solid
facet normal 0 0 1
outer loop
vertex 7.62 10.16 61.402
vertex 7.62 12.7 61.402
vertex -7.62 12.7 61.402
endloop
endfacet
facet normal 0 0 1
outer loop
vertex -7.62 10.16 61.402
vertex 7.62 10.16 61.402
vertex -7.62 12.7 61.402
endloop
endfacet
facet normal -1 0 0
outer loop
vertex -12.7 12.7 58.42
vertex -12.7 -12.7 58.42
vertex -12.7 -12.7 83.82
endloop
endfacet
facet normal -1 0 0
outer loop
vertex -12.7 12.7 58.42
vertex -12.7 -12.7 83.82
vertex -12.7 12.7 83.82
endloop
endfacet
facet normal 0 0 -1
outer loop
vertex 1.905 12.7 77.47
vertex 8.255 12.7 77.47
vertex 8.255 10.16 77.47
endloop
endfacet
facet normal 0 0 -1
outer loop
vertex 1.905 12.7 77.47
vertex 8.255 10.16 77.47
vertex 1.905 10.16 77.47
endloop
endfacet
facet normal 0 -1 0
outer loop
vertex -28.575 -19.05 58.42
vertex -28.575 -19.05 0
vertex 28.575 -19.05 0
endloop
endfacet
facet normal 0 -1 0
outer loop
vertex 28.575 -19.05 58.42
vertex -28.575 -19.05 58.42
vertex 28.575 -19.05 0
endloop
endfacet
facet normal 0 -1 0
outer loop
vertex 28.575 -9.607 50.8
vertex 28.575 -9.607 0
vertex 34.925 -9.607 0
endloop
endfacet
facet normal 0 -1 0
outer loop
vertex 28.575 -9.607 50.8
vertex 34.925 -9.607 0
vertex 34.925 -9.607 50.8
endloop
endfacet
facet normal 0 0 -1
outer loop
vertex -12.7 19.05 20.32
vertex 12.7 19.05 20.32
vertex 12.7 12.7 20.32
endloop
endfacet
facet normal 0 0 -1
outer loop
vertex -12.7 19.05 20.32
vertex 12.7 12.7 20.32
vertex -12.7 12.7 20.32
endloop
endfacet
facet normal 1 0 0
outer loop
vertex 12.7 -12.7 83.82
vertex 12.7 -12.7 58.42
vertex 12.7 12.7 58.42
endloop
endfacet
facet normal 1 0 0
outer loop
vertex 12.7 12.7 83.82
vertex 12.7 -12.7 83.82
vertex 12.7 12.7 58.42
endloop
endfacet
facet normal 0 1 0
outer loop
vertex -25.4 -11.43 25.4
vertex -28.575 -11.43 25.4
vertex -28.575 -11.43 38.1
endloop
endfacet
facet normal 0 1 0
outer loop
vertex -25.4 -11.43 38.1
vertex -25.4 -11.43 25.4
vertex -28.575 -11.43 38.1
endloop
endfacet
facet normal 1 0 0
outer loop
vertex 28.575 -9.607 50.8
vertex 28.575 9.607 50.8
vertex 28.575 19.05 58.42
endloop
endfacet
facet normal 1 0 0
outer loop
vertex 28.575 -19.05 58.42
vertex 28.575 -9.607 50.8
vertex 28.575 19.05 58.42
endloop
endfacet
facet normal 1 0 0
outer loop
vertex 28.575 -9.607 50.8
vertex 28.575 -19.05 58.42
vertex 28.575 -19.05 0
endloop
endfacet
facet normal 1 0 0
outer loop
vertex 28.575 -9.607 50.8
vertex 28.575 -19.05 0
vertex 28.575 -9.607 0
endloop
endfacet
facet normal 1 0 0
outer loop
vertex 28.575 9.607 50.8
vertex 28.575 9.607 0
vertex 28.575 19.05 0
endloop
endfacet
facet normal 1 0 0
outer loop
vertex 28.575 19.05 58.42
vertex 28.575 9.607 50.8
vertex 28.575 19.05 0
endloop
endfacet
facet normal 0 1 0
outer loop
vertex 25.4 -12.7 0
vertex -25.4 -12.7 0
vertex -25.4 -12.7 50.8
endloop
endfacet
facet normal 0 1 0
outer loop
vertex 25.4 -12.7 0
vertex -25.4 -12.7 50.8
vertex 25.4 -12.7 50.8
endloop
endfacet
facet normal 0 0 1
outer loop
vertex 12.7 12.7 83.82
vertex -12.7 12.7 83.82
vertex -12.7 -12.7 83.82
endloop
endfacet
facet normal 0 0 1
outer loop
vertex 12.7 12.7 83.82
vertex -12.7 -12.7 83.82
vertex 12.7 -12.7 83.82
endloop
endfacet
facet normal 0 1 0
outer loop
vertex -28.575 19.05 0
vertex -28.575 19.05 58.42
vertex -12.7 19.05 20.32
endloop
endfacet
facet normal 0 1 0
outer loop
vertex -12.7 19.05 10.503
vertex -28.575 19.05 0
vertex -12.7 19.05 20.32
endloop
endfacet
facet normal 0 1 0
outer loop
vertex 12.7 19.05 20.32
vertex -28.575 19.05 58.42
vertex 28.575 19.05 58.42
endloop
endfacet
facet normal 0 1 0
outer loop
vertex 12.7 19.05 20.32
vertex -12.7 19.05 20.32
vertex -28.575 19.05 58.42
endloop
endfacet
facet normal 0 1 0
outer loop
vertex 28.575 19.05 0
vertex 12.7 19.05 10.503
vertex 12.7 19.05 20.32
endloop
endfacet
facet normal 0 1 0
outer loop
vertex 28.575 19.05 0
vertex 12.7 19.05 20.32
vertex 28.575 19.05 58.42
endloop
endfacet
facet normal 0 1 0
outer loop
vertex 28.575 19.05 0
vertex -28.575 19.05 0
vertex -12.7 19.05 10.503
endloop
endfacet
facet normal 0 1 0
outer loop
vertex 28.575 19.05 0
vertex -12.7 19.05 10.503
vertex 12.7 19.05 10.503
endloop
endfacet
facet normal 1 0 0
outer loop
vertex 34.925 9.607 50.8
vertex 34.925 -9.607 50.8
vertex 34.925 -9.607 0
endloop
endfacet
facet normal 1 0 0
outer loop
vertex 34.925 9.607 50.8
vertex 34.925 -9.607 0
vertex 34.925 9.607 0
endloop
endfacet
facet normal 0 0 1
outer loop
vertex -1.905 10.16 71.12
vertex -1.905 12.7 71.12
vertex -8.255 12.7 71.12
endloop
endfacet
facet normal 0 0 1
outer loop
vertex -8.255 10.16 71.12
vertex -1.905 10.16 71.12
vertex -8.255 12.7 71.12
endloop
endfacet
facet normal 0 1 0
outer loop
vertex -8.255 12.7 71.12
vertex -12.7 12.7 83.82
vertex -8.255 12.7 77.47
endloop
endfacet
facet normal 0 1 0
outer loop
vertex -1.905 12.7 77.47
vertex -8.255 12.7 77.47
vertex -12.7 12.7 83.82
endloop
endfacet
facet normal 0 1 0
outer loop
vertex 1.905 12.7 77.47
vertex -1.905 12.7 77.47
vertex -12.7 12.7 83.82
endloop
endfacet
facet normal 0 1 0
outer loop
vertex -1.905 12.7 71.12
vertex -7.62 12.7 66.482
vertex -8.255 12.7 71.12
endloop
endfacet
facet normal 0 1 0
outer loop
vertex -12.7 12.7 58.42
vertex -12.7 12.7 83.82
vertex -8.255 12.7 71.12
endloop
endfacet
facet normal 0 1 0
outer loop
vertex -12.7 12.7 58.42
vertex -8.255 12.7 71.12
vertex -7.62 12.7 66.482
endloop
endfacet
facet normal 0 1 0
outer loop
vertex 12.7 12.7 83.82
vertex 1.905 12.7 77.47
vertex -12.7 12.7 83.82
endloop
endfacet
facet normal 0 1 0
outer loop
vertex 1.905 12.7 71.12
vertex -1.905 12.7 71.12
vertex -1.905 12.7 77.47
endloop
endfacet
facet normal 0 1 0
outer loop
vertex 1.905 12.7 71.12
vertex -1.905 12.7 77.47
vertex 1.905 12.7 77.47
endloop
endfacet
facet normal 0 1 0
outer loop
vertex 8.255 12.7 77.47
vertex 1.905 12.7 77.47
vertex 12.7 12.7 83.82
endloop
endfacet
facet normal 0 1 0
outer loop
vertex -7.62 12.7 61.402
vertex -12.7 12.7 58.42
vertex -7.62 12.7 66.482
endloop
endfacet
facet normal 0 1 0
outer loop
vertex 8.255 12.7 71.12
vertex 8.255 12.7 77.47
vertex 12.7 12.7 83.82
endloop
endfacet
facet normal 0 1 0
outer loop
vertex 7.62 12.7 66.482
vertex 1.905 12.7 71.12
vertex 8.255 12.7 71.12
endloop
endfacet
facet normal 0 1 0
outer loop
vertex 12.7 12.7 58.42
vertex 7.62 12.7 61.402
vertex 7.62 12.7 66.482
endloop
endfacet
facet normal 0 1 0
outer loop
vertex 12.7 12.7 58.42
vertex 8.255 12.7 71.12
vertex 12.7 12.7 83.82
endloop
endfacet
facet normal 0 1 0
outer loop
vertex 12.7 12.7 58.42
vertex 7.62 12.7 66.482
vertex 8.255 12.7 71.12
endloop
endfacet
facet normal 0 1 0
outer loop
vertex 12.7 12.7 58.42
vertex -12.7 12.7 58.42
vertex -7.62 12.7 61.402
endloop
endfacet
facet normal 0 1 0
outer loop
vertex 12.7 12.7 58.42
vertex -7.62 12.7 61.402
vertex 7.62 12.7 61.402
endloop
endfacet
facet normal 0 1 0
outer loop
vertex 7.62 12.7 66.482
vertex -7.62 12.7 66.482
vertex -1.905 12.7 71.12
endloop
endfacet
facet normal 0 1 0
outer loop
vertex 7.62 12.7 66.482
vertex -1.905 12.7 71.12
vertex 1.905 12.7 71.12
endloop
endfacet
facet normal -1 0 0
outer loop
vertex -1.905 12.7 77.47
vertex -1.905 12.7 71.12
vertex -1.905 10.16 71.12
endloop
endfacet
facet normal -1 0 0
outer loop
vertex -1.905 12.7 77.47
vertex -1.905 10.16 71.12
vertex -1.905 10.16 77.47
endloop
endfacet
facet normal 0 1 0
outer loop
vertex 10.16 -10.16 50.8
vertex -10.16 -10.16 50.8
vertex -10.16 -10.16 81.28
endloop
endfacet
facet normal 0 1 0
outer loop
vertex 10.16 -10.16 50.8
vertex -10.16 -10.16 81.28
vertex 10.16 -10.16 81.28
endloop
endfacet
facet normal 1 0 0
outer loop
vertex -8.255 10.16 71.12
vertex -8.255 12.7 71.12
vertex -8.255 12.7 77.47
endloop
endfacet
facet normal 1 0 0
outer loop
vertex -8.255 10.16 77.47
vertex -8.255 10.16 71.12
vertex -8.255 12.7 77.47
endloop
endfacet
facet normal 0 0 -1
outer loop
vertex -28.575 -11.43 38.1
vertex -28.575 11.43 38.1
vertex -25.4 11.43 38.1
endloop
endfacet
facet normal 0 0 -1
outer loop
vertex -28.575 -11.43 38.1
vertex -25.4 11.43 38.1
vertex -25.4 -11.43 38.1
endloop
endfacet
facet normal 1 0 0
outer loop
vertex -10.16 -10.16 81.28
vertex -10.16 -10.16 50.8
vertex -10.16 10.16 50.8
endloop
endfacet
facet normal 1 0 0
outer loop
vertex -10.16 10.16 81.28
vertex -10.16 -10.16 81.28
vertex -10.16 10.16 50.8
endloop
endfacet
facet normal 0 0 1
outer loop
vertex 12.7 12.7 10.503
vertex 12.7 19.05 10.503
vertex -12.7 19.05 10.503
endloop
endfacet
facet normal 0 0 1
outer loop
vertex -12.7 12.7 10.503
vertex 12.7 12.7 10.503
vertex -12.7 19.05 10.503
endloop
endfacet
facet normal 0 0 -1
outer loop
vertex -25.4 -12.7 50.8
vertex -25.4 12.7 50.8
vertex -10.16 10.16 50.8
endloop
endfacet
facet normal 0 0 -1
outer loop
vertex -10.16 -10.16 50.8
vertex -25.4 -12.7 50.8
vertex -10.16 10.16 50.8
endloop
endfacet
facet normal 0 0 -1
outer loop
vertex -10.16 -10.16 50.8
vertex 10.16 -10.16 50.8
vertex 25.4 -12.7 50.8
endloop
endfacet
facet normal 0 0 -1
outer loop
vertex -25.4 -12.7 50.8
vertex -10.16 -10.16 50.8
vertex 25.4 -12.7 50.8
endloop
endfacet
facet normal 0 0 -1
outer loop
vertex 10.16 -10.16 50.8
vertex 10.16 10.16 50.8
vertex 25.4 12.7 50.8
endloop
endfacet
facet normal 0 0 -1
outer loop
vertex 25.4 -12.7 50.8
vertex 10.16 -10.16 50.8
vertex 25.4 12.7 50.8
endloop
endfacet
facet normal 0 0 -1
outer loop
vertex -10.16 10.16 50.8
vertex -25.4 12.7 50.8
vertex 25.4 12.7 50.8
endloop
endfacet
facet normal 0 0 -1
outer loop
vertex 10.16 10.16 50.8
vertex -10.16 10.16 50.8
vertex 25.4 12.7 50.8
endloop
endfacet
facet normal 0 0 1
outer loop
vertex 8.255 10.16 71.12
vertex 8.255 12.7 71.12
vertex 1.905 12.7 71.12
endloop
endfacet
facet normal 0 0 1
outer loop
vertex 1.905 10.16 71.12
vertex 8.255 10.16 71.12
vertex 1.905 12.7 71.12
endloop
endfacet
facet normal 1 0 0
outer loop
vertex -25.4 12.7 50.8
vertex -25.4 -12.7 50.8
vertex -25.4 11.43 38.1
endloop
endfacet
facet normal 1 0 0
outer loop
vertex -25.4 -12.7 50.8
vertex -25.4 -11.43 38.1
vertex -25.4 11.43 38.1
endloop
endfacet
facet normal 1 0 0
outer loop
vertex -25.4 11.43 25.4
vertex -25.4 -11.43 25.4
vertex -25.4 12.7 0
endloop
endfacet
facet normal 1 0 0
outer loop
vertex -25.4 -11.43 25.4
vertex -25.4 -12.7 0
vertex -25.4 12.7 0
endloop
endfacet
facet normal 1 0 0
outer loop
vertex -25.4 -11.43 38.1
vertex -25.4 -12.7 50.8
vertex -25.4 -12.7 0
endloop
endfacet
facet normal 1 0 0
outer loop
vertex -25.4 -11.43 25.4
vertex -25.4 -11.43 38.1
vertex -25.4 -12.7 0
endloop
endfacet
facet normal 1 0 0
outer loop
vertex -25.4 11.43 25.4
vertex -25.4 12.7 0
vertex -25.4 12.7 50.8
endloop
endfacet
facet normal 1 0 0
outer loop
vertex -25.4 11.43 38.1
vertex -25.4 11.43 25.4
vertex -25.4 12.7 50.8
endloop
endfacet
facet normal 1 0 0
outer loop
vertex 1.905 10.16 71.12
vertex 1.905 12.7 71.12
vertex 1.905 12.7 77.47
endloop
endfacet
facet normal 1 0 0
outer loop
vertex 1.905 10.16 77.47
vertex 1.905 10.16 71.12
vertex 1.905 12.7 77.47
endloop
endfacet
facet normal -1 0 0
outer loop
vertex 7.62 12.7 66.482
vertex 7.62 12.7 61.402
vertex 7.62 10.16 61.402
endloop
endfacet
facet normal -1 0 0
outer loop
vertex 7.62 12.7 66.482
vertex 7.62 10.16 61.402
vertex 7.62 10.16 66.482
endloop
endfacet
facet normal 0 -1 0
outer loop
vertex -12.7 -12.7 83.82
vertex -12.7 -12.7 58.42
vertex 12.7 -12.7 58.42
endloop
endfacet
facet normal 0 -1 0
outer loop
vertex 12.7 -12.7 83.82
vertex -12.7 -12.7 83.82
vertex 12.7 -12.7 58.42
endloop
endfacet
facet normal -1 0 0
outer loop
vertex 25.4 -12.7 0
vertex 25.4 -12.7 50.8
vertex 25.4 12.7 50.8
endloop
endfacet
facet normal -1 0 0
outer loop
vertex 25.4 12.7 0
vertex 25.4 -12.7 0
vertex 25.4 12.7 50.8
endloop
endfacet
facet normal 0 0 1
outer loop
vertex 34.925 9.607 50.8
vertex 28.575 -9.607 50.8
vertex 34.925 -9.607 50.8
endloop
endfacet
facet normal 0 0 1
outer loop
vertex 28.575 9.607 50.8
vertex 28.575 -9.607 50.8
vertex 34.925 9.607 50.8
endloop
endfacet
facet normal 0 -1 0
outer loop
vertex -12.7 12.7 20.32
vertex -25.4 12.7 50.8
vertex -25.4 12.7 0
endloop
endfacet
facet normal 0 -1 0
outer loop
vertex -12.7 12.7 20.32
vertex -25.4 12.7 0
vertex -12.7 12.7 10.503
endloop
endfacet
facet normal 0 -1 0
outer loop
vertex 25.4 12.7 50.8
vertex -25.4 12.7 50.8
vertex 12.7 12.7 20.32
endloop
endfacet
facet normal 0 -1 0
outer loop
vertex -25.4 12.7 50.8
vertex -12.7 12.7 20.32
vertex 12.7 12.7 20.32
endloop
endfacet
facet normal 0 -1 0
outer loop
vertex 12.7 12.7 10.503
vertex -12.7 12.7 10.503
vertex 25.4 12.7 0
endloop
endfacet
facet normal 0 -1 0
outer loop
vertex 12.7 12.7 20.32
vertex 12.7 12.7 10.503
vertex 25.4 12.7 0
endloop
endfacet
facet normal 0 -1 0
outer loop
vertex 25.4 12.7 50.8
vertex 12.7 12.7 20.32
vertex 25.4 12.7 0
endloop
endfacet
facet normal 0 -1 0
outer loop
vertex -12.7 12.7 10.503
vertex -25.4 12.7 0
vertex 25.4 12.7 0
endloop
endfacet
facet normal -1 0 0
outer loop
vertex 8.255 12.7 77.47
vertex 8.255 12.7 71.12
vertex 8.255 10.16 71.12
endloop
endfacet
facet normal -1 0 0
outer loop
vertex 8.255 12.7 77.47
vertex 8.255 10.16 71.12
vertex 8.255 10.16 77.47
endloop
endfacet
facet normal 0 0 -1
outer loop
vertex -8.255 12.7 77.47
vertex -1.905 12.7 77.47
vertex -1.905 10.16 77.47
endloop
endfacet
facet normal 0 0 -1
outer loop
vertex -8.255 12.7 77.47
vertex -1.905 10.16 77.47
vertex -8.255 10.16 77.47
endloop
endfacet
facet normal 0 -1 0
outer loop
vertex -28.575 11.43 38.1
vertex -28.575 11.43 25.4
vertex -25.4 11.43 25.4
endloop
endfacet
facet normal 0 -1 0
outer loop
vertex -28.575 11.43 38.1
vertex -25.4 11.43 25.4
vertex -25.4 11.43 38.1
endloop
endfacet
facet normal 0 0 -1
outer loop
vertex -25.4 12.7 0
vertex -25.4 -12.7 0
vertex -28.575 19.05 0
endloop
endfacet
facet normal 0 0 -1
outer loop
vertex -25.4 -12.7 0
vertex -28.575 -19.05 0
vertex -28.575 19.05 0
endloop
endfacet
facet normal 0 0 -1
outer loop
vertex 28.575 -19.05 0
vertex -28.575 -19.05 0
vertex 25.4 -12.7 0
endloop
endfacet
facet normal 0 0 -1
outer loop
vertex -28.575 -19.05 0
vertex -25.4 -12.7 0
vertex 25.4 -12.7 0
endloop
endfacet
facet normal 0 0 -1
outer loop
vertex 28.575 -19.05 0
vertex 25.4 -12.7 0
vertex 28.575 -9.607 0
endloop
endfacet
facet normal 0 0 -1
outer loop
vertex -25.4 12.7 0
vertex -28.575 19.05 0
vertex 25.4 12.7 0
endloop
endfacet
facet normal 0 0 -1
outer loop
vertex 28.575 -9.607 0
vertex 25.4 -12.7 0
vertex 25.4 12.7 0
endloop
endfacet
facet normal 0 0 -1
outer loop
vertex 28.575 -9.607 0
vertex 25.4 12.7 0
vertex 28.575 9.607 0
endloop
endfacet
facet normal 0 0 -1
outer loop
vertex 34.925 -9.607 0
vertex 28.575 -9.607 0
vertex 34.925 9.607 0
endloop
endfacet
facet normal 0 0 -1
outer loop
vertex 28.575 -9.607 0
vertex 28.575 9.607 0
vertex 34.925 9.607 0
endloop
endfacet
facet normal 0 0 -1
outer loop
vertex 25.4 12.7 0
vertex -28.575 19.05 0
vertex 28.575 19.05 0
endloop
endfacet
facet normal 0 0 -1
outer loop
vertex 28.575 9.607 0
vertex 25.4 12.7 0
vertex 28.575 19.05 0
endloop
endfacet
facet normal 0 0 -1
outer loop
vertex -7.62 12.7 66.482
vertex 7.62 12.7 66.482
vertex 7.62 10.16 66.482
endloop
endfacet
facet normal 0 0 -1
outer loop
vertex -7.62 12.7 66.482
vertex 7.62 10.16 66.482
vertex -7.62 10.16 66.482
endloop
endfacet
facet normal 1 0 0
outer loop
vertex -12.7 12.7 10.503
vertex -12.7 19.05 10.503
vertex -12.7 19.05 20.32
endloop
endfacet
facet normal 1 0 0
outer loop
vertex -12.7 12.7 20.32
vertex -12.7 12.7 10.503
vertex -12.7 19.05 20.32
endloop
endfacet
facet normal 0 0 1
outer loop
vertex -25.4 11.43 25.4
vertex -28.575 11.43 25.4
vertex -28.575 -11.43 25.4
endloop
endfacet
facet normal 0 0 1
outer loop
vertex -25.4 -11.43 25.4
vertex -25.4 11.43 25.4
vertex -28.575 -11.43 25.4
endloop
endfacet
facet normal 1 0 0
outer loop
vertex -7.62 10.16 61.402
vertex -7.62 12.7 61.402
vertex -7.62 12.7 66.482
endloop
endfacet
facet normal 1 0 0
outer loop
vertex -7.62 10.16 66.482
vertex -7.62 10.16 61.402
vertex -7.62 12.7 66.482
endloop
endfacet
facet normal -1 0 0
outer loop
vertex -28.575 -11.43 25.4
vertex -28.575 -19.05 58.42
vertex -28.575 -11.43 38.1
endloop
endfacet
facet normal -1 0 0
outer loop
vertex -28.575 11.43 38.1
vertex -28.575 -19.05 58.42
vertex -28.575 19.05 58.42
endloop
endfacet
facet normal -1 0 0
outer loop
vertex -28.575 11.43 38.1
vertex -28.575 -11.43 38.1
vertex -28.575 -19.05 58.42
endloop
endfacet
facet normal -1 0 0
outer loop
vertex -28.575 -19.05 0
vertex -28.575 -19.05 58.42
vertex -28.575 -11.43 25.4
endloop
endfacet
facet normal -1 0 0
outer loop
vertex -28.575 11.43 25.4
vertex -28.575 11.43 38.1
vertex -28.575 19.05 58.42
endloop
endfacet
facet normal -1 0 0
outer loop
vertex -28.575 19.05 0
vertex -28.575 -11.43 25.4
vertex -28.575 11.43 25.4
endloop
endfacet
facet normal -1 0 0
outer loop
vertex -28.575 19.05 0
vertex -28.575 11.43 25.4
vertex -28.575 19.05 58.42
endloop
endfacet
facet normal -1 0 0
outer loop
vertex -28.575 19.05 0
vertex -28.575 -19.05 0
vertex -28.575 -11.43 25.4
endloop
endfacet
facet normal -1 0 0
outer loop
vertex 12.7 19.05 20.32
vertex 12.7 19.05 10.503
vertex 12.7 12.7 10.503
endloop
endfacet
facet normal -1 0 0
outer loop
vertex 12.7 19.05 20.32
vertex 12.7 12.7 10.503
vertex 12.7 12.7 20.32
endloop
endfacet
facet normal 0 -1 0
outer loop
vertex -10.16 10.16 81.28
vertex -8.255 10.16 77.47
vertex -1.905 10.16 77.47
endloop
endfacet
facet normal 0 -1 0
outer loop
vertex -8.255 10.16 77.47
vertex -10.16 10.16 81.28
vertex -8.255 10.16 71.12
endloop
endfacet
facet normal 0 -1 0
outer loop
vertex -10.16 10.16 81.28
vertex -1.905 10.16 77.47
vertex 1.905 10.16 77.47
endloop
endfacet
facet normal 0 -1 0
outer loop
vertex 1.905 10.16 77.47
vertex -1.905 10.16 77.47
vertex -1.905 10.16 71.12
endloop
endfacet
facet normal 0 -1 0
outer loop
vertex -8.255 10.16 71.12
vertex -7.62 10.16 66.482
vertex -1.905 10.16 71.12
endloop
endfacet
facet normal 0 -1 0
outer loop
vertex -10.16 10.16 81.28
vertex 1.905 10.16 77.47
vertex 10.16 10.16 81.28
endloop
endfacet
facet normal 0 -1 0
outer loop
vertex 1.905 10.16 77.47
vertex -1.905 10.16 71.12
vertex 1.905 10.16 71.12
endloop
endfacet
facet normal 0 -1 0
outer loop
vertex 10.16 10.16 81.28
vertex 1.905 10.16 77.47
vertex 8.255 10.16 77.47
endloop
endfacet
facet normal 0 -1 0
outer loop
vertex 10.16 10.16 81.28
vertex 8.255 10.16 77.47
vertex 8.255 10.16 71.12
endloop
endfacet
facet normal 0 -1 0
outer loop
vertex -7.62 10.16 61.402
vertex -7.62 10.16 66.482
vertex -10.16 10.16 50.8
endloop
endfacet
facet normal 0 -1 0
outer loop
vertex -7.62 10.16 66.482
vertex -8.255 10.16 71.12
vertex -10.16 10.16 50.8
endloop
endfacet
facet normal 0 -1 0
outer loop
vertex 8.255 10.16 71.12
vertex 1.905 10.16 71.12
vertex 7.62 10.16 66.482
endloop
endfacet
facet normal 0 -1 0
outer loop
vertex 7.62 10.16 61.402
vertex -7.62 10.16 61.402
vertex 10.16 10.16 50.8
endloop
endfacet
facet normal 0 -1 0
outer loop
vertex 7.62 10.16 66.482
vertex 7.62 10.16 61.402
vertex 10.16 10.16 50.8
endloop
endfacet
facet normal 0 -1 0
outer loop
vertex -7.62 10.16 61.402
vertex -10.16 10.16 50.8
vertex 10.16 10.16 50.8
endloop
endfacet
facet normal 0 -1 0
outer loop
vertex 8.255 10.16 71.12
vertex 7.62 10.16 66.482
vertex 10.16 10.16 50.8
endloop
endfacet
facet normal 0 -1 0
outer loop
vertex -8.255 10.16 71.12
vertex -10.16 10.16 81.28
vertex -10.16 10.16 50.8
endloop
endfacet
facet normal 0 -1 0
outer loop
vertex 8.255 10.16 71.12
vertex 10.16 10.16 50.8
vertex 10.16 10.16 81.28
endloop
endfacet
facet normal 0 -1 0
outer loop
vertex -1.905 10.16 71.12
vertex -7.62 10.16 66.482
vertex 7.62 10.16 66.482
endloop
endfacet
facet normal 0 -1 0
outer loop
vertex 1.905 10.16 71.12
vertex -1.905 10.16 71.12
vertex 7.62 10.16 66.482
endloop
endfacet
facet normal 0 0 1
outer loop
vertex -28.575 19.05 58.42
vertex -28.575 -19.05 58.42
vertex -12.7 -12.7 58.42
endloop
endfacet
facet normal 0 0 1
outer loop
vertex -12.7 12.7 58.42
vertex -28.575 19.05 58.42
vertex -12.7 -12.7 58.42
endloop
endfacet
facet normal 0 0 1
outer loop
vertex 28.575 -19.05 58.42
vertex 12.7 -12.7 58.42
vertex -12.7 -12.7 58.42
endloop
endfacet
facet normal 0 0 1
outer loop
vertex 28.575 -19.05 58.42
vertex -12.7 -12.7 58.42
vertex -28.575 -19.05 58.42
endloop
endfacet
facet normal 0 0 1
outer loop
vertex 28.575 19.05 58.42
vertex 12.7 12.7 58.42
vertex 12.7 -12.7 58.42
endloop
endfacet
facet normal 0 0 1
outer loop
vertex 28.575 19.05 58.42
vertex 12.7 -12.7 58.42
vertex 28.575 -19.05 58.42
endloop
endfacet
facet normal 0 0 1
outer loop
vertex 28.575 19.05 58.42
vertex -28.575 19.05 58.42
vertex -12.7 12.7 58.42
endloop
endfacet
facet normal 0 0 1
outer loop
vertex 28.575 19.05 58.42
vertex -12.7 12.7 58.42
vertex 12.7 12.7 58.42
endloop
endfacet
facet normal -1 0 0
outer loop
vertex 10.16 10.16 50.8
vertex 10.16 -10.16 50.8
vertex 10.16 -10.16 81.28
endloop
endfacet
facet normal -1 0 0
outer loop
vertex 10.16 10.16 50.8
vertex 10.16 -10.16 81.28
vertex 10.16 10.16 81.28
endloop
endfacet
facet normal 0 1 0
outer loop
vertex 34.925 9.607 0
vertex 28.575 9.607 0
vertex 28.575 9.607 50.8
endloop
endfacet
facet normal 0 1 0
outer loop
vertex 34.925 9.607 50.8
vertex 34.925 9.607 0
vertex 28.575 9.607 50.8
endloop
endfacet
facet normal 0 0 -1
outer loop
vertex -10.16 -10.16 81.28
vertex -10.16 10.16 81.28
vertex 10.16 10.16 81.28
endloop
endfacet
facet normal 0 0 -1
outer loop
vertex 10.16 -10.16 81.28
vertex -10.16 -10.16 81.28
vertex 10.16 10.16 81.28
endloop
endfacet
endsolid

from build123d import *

# Parameters (mm, degrees)
F0_W      = 57.15
F0_H      = 38.1
F1_DEPTH  = 58.42
F2_W      = 25.4
F2_H      = 25.4
F3_DEPTH  = 25.4
F4_W      = 50.8
F4_H      = 25.4
F5_DEPTH  = 50.8
F6_W      = 20.32
F6_H      = 20.32
F7_DEPTH  = 81.28
F8_W      = 22.86
F8_H      = 12.7
F9_DEPTH  = 25.4
F10_W     = 6.35
F10_H     = 6.35
F10_W_2   = 15.24
F10_H_2   = 5.08
F11_DEPTH = 12.7
F12_W     = 25.4
F12_H     = 9.817438
F13_DEPTH = 12.7
F14_W     = 19.21422
F14_H     = 50.8
F15_DEPTH = 6.35


with BuildPart() as f1:
    # F0 (on Top) → F1 (new body)
    with BuildSketch(Plane.XY):
        Rectangle(F0_W, F0_H)
    extrude(amount=F1_DEPTH)

    # F2 (on face) → F3 (join)
    with BuildSketch(Plane.XY.offset(58.42)):
        Rectangle(F2_W, F2_H)
    extrude(amount=F3_DEPTH)

    # F4 (on face) → F5 (cut)
    with BuildSketch(Plane.XY):
        Rectangle(F4_W, F4_H)
    extrude(amount=F5_DEPTH, mode=Mode.SUBTRACT)

    # F6 (on face) → F7 (cut)
    with BuildSketch(Plane.XY):
        Rectangle(F6_W, F6_H)
    extrude(amount=F7_DEPTH, mode=Mode.SUBTRACT)

    # F8 (on face) → F9 (cut)
    with BuildSketch(Plane(origin=(-28.575, 0, 0), x_dir=(0, -1, 0), z_dir=(-1, 0, 0))):
        with Locations((0, 31.75)):
            Rectangle(F8_W, F8_H)
    extrude(amount=-F9_DEPTH, mode=Mode.SUBTRACT)

    # F10 (on face) → F11 (cut)
    with BuildSketch(Plane(origin=(0, 12.7, 0), x_dir=(-1, 0, 0), z_dir=(0, 1, 0))):
        with Locations((-5.08, 74.295)):
            Rectangle(F10_W, F10_H)
        with Locations((5.08, 74.295)):
            Rectangle(F10_W, F10_H)
        with Locations((0, 63.942472)):
            Rectangle(F10_W_2, F10_H_2)
    extrude(amount=-F11_DEPTH, mode=Mode.SUBTRACT)

    # F12 (on face) → F13 (cut)
    with BuildSketch(Plane(origin=(0, 19.05, 0), x_dir=(-1, 0, 0), z_dir=(0, 1, 0))):
        with Locations((0, 15.411281)):
            Rectangle(F12_W, F12_H)
    extrude(amount=-F13_DEPTH, mode=Mode.SUBTRACT)

    # F14 (on face) → F15 (join)
    with BuildSketch(Plane.YZ.offset(28.575)):
        with Locations((0, 25.4)):
            Rectangle(F14_W, F14_H)
    extrude(amount=F15_DEPTH)


solid = f1.part
